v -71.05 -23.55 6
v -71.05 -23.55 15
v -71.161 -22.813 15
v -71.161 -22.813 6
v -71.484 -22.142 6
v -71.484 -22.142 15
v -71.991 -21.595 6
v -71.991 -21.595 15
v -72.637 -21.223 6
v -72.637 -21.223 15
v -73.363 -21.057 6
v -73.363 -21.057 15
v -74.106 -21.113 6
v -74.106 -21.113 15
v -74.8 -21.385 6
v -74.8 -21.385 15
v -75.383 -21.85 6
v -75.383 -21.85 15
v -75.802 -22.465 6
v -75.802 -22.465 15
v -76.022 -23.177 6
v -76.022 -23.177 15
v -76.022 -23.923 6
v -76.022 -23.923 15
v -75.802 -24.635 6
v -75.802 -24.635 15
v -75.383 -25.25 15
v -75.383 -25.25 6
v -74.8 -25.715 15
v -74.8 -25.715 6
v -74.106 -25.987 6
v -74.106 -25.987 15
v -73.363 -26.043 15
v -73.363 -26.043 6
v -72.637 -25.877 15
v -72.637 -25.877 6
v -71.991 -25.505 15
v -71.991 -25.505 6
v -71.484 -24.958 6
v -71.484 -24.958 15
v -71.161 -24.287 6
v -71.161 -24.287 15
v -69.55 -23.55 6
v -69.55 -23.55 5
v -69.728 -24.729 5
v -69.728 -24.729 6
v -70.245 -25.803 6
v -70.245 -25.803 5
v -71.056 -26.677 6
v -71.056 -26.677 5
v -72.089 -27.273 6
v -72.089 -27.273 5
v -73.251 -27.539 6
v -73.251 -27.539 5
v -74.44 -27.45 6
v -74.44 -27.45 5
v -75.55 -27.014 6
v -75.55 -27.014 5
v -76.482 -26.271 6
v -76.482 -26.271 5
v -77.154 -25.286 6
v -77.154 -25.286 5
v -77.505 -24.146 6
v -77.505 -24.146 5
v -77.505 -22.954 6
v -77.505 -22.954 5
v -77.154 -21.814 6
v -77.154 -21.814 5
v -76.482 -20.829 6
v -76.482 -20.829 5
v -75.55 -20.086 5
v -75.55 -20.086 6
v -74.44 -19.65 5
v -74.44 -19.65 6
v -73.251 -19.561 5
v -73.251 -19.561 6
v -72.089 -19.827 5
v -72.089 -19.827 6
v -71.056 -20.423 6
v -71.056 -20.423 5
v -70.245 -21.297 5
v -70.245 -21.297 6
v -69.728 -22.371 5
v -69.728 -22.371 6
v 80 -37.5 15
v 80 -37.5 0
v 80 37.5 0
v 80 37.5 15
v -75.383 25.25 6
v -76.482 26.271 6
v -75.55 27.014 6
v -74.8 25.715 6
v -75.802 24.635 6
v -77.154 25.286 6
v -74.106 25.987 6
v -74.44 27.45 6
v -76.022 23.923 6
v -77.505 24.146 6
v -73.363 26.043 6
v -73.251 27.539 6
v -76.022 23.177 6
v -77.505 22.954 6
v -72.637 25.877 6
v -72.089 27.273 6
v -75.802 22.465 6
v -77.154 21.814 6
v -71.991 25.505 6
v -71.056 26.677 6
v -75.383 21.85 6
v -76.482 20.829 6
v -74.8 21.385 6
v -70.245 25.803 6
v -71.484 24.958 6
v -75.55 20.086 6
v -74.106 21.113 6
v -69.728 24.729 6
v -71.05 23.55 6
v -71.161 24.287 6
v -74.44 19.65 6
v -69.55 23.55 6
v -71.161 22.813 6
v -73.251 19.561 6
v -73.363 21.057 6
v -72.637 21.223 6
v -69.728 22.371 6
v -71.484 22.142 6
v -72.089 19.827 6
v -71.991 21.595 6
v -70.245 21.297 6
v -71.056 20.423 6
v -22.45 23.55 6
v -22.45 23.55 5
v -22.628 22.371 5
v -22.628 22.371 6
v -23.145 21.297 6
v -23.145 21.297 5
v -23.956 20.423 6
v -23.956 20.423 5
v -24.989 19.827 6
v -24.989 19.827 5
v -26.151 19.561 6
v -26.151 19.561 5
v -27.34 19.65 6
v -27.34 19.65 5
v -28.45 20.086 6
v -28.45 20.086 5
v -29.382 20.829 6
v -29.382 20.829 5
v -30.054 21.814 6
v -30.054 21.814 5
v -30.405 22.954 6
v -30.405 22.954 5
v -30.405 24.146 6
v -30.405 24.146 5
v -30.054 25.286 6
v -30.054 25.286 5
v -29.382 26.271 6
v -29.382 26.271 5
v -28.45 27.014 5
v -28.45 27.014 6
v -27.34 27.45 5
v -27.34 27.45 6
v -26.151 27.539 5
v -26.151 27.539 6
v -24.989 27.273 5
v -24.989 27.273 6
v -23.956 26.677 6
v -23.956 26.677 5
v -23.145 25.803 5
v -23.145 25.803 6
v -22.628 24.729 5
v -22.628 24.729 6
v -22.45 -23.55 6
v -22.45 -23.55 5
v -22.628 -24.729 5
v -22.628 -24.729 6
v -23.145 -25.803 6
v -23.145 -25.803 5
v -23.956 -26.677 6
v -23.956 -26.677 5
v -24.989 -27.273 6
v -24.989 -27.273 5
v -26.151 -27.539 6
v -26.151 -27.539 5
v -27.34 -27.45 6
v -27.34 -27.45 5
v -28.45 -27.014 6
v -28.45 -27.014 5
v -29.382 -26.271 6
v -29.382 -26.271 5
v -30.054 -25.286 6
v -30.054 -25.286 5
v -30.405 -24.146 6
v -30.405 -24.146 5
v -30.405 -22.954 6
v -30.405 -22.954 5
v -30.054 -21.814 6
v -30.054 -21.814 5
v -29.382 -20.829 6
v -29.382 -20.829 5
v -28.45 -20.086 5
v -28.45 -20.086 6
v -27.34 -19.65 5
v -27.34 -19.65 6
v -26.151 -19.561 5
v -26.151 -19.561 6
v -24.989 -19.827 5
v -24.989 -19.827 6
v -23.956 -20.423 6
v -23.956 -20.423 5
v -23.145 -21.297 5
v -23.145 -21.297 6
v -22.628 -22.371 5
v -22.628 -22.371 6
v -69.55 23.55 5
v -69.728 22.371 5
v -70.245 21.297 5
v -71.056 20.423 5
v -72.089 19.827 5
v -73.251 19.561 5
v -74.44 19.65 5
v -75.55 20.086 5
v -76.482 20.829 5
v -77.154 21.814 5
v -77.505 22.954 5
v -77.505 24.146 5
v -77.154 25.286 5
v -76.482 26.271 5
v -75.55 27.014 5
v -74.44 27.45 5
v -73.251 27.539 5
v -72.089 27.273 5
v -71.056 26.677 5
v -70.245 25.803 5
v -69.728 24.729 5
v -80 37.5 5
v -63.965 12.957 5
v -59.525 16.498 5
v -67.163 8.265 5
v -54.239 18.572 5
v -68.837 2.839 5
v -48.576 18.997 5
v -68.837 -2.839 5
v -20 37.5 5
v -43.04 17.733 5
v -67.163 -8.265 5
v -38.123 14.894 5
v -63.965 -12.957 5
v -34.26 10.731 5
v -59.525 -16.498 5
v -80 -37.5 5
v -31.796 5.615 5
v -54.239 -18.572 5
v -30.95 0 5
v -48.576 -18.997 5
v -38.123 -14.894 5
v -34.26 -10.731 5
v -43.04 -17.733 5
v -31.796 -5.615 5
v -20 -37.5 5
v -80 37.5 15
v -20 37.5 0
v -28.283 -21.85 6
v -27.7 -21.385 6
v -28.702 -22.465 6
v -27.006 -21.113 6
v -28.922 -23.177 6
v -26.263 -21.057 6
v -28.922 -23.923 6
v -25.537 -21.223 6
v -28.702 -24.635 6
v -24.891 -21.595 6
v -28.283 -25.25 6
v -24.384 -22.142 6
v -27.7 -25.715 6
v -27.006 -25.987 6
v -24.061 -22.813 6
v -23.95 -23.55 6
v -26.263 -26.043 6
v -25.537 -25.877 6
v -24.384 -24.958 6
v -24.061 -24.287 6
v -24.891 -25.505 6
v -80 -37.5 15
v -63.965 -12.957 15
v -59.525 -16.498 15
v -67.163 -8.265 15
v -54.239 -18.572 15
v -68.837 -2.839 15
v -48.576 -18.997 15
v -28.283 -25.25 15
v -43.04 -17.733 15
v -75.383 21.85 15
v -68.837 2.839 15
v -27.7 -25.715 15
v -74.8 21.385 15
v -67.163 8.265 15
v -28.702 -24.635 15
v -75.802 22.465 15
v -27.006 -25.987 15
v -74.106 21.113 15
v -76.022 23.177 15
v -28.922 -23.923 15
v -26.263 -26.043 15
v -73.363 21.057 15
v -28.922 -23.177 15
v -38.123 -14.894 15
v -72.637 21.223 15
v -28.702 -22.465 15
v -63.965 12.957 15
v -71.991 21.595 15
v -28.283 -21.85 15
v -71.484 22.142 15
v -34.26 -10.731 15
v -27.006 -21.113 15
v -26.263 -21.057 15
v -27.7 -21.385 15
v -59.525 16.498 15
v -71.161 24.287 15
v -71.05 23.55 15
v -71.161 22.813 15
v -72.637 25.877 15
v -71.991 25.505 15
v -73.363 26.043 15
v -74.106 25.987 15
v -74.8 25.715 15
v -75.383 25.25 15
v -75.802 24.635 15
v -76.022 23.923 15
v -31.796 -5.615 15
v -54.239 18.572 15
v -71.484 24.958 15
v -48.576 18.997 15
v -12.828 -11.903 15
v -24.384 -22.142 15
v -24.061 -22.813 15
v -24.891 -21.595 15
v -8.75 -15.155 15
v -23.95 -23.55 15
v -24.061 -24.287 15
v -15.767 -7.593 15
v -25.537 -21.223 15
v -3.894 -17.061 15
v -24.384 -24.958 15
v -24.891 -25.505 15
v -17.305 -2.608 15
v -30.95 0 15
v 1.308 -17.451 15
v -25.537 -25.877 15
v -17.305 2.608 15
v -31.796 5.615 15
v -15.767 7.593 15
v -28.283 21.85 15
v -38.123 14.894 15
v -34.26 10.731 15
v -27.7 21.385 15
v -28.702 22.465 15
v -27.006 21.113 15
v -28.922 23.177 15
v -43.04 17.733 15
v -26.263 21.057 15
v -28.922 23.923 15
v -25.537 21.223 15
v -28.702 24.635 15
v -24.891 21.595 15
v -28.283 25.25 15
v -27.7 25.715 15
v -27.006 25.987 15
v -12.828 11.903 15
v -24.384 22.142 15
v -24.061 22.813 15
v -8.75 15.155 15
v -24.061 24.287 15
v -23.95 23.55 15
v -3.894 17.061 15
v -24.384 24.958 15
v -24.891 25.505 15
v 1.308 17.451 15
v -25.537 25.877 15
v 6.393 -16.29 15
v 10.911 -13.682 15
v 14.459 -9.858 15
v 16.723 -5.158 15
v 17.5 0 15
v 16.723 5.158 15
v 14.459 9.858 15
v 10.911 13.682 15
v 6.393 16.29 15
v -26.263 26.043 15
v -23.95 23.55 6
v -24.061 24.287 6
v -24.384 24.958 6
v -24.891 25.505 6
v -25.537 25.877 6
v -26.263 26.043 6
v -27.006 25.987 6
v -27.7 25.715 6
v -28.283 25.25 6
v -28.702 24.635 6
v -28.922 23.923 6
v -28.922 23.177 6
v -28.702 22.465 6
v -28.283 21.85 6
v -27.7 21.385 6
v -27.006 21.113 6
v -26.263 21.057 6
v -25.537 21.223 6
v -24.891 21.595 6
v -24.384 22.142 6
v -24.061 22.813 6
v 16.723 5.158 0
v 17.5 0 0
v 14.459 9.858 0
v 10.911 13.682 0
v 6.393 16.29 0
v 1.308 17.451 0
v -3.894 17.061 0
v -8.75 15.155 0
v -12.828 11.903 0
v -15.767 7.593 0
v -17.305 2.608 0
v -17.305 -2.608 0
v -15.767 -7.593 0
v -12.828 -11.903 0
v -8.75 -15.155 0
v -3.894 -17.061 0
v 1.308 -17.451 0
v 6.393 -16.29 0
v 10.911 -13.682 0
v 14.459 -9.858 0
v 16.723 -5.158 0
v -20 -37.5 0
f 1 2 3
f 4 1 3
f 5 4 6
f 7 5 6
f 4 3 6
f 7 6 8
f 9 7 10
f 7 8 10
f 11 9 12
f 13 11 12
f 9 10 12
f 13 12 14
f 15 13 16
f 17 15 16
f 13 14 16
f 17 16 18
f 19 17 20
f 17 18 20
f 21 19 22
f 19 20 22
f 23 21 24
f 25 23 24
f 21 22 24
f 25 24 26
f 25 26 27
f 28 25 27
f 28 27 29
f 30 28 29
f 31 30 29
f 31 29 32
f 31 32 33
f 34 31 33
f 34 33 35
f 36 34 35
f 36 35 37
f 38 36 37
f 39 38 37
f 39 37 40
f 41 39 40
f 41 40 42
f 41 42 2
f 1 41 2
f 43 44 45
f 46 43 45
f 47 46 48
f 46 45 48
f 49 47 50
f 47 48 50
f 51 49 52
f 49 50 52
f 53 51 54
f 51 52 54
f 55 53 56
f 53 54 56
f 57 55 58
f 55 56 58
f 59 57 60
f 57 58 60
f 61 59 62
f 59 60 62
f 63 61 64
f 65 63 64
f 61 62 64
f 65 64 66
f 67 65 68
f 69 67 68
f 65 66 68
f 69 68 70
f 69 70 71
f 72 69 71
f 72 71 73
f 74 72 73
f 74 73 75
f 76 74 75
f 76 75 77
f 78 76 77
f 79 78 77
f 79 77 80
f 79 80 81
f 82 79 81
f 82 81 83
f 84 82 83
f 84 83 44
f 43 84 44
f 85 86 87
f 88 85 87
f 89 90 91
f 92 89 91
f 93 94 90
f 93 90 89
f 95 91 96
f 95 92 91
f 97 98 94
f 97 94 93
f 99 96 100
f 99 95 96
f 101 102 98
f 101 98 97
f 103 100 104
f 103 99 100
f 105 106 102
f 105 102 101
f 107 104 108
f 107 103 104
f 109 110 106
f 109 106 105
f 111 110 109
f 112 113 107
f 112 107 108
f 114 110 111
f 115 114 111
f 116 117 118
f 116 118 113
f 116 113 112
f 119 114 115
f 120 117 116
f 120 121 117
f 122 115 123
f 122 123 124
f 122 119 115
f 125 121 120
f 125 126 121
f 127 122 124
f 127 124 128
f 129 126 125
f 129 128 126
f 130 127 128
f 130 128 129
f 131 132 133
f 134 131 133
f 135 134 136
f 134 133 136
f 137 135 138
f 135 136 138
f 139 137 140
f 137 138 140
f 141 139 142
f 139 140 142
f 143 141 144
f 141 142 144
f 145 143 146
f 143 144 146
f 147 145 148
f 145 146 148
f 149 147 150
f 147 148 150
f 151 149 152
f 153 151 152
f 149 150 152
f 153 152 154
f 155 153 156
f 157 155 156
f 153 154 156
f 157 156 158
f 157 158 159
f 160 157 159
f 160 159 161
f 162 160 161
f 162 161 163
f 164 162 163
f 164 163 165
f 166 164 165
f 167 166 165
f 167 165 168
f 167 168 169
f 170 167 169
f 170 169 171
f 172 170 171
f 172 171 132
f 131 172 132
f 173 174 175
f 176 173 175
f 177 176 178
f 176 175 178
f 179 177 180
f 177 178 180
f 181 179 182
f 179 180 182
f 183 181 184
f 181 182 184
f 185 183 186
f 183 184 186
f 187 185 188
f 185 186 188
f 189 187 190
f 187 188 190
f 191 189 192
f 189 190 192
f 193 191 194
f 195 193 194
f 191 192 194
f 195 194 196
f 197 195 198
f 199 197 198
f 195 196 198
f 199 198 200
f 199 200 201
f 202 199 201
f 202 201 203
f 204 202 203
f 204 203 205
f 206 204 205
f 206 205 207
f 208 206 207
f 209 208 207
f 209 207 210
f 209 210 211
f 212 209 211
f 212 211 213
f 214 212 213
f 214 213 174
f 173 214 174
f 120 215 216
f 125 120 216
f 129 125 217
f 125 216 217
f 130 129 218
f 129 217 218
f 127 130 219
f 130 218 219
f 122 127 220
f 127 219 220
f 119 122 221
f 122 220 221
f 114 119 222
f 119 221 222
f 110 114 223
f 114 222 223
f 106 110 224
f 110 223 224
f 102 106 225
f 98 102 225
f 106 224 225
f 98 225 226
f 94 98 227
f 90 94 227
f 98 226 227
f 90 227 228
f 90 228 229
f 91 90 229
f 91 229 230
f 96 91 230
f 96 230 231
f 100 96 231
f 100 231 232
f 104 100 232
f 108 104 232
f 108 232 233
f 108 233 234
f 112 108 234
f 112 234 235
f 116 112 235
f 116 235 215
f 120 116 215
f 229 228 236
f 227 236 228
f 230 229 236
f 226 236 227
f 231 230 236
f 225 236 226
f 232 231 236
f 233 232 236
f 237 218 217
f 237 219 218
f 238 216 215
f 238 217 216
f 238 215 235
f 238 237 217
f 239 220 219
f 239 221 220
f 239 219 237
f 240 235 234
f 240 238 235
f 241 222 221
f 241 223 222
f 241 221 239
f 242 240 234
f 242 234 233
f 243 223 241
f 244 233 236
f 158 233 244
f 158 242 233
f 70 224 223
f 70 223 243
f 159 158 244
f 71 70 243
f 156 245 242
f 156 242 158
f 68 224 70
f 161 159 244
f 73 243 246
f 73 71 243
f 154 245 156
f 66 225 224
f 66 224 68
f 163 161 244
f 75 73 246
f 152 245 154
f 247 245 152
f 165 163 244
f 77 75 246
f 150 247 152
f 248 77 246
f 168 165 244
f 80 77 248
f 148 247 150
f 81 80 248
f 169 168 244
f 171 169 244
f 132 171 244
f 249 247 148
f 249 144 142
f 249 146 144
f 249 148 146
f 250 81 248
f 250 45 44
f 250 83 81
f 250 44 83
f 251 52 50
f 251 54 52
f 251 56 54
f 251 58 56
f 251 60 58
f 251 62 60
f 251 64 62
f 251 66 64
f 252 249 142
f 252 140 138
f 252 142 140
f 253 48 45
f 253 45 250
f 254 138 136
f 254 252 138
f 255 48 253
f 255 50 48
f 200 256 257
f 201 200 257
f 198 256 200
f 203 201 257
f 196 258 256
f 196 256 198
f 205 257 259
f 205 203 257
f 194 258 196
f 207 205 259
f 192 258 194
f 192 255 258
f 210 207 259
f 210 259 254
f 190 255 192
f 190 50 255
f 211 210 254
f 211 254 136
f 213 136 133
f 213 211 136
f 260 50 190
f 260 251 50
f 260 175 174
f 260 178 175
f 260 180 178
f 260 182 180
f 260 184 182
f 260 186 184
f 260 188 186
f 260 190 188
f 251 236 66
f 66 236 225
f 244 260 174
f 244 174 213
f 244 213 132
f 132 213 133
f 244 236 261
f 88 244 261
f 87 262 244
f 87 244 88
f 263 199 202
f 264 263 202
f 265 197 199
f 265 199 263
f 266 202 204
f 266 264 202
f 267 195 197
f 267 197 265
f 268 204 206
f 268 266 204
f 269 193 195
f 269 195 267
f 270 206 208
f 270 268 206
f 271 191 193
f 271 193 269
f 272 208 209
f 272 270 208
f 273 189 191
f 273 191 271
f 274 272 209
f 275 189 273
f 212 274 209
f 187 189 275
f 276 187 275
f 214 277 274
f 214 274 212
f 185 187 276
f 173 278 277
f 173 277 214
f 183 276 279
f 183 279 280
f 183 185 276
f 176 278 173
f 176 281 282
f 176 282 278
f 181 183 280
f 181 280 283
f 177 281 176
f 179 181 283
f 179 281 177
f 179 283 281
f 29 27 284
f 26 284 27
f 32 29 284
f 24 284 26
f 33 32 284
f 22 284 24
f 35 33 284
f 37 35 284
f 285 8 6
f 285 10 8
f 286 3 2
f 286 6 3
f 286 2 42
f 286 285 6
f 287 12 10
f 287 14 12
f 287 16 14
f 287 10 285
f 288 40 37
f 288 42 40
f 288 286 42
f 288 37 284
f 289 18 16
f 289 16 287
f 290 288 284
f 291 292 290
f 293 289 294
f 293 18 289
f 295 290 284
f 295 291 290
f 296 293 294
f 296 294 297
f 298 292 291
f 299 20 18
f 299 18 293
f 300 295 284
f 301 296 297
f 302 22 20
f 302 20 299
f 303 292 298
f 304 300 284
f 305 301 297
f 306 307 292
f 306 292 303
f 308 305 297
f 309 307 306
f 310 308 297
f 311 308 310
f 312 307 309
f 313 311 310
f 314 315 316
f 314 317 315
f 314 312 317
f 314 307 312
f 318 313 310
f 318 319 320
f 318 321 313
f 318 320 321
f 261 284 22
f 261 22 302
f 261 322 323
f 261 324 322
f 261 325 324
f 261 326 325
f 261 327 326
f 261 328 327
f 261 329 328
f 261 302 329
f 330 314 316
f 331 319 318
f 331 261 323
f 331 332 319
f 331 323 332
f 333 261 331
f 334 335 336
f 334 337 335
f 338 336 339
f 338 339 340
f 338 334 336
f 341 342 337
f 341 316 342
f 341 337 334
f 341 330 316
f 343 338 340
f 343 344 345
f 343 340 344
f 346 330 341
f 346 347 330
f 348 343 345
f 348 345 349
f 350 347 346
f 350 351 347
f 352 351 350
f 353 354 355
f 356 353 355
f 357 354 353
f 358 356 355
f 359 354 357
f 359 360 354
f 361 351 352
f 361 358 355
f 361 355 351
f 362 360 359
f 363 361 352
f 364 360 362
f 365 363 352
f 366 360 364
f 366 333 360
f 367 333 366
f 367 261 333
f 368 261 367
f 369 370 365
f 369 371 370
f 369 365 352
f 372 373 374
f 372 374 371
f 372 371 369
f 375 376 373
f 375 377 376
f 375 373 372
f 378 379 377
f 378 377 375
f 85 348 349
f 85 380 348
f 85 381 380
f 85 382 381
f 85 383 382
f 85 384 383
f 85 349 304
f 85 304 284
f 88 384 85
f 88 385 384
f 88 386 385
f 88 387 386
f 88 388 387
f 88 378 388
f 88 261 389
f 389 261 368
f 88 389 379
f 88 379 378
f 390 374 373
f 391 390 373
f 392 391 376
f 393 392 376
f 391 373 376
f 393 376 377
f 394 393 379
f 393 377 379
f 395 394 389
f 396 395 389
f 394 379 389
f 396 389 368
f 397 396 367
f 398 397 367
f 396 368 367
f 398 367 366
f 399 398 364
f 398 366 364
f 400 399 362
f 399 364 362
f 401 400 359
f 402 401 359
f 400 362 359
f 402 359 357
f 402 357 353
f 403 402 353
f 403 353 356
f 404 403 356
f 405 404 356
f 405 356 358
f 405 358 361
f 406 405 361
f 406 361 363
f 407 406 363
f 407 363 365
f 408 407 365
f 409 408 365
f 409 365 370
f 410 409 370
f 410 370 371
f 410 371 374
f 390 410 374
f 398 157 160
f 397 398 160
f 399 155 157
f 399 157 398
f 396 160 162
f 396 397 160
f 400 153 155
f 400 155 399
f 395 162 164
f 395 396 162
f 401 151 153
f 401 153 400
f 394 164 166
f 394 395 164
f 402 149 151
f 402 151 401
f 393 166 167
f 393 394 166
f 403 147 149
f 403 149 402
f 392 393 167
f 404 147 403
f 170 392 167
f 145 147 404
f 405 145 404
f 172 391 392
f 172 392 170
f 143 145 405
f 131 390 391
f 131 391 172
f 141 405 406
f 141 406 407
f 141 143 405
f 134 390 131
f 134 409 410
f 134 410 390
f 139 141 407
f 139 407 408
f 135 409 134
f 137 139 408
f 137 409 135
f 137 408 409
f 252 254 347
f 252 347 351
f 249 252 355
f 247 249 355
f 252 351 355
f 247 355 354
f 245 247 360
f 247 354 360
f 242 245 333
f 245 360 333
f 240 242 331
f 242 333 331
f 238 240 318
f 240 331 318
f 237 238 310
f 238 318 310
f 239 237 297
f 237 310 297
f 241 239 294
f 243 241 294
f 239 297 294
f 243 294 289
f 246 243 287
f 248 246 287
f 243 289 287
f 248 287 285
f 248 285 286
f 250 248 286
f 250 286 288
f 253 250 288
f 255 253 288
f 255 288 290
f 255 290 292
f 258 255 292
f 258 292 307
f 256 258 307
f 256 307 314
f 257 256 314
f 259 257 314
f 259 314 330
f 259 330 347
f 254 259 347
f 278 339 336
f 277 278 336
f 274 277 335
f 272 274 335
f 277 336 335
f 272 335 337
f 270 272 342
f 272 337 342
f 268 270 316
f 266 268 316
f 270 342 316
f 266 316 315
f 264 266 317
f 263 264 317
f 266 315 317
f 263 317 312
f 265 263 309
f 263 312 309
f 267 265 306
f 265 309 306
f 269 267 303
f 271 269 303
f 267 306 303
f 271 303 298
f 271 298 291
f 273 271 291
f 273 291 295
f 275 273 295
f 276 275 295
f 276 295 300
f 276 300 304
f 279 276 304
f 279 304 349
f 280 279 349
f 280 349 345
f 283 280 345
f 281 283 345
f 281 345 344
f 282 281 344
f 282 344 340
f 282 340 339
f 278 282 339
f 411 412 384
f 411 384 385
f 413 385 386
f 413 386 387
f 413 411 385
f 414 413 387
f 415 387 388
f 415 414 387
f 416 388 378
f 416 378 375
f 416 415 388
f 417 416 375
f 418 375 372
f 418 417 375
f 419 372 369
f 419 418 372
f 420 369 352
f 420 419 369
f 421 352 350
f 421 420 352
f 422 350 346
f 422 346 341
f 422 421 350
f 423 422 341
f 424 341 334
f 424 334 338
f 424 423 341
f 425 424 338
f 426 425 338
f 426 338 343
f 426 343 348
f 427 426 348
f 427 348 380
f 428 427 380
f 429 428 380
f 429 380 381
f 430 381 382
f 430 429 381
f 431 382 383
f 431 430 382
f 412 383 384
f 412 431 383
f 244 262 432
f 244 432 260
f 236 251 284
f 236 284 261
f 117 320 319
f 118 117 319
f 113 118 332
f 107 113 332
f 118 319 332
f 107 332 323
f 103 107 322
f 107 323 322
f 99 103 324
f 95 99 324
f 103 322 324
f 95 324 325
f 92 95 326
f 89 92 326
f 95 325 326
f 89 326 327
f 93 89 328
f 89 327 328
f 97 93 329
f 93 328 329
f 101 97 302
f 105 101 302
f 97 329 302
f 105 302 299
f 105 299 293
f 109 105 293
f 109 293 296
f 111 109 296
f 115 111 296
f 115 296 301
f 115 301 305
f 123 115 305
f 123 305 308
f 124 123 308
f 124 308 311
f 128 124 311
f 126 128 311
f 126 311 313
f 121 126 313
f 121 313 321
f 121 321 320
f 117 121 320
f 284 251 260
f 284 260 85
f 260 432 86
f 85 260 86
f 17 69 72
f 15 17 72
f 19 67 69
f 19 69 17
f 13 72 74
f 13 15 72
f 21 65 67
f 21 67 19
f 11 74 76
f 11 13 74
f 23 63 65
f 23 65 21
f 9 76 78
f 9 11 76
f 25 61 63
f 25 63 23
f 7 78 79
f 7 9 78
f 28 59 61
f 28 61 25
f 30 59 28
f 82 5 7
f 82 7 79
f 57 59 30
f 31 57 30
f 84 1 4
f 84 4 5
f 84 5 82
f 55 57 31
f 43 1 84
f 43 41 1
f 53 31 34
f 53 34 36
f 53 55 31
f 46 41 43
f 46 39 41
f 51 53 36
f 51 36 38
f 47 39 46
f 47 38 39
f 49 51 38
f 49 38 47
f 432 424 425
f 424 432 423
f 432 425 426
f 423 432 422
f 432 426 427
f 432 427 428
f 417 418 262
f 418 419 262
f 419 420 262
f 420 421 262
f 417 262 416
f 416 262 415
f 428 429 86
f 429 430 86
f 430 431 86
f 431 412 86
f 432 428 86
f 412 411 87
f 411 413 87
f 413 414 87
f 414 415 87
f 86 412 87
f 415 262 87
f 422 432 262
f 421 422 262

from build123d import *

# Parameters (mm, degrees)
F0_W     = 160
F0_H     = 75
F0_R     = 17.5
F1_DEPTH = 15
F2_R     = 2.5
F2_R_2   = 19.05
F3_DEPTH = 25
F4_R     = 4
F5_DEPTH = 6
F6_W     = 60
F6_H     = 5
F7_DEPTH = 79.7


# Not quite as in the source:
# - a feature names something its author has since deleted; it is built from what else it names


with BuildPart() as f1:
    # F0 (on Top) → F1 (new body)
    with BuildSketch(Plane.XY):
        Rectangle(F0_W, F0_H)
        Circle(F0_R, mode=Mode.SUBTRACT)
    extrude(amount=F1_DEPTH)

    # F2 (on face) → F3 (cut)
    with BuildSketch(Plane.XY.offset(15)):
        with Locations((-73.55, 23.55)):
            Circle(F2_R)
        with Locations((-26.45, 23.55)):
            Circle(F2_R)
        with Locations((-26.45, -23.55)):
            Circle(F2_R)
        with Locations((-73.55, -23.55)):
            Circle(F2_R)
        with Locations((-50, 0)):
            Circle(F2_R_2)
    extrude(amount=-F3_DEPTH, mode=Mode.SUBTRACT)

    # F4 (on face) → F5 (cut)
    with BuildSketch(Plane(origin=(0, 0, 0), x_dir=(1, 0, 0), z_dir=(0, 0, -1))):
        with Locations((-73.55, 23.55)):
            Circle(F4_R)
        with Locations((-26.45, 23.55)):
            Circle(F4_R)
        with Locations((-26.45, -23.55)):
            Circle(F4_R)
        with Locations((-73.55, -23.55)):
            Circle(F4_R)
    extrude(amount=-F5_DEPTH, mode=Mode.SUBTRACT)

    # F6 (on face) → F7 (cut)
    with BuildSketch(Plane.XZ.offset(37.5)):
        with Locations((-50, 2.5)):
            Rectangle(F6_W, F6_H)
    extrude(amount=-F7_DEPTH, mode=Mode.SUBTRACT)


solid = f1.part
